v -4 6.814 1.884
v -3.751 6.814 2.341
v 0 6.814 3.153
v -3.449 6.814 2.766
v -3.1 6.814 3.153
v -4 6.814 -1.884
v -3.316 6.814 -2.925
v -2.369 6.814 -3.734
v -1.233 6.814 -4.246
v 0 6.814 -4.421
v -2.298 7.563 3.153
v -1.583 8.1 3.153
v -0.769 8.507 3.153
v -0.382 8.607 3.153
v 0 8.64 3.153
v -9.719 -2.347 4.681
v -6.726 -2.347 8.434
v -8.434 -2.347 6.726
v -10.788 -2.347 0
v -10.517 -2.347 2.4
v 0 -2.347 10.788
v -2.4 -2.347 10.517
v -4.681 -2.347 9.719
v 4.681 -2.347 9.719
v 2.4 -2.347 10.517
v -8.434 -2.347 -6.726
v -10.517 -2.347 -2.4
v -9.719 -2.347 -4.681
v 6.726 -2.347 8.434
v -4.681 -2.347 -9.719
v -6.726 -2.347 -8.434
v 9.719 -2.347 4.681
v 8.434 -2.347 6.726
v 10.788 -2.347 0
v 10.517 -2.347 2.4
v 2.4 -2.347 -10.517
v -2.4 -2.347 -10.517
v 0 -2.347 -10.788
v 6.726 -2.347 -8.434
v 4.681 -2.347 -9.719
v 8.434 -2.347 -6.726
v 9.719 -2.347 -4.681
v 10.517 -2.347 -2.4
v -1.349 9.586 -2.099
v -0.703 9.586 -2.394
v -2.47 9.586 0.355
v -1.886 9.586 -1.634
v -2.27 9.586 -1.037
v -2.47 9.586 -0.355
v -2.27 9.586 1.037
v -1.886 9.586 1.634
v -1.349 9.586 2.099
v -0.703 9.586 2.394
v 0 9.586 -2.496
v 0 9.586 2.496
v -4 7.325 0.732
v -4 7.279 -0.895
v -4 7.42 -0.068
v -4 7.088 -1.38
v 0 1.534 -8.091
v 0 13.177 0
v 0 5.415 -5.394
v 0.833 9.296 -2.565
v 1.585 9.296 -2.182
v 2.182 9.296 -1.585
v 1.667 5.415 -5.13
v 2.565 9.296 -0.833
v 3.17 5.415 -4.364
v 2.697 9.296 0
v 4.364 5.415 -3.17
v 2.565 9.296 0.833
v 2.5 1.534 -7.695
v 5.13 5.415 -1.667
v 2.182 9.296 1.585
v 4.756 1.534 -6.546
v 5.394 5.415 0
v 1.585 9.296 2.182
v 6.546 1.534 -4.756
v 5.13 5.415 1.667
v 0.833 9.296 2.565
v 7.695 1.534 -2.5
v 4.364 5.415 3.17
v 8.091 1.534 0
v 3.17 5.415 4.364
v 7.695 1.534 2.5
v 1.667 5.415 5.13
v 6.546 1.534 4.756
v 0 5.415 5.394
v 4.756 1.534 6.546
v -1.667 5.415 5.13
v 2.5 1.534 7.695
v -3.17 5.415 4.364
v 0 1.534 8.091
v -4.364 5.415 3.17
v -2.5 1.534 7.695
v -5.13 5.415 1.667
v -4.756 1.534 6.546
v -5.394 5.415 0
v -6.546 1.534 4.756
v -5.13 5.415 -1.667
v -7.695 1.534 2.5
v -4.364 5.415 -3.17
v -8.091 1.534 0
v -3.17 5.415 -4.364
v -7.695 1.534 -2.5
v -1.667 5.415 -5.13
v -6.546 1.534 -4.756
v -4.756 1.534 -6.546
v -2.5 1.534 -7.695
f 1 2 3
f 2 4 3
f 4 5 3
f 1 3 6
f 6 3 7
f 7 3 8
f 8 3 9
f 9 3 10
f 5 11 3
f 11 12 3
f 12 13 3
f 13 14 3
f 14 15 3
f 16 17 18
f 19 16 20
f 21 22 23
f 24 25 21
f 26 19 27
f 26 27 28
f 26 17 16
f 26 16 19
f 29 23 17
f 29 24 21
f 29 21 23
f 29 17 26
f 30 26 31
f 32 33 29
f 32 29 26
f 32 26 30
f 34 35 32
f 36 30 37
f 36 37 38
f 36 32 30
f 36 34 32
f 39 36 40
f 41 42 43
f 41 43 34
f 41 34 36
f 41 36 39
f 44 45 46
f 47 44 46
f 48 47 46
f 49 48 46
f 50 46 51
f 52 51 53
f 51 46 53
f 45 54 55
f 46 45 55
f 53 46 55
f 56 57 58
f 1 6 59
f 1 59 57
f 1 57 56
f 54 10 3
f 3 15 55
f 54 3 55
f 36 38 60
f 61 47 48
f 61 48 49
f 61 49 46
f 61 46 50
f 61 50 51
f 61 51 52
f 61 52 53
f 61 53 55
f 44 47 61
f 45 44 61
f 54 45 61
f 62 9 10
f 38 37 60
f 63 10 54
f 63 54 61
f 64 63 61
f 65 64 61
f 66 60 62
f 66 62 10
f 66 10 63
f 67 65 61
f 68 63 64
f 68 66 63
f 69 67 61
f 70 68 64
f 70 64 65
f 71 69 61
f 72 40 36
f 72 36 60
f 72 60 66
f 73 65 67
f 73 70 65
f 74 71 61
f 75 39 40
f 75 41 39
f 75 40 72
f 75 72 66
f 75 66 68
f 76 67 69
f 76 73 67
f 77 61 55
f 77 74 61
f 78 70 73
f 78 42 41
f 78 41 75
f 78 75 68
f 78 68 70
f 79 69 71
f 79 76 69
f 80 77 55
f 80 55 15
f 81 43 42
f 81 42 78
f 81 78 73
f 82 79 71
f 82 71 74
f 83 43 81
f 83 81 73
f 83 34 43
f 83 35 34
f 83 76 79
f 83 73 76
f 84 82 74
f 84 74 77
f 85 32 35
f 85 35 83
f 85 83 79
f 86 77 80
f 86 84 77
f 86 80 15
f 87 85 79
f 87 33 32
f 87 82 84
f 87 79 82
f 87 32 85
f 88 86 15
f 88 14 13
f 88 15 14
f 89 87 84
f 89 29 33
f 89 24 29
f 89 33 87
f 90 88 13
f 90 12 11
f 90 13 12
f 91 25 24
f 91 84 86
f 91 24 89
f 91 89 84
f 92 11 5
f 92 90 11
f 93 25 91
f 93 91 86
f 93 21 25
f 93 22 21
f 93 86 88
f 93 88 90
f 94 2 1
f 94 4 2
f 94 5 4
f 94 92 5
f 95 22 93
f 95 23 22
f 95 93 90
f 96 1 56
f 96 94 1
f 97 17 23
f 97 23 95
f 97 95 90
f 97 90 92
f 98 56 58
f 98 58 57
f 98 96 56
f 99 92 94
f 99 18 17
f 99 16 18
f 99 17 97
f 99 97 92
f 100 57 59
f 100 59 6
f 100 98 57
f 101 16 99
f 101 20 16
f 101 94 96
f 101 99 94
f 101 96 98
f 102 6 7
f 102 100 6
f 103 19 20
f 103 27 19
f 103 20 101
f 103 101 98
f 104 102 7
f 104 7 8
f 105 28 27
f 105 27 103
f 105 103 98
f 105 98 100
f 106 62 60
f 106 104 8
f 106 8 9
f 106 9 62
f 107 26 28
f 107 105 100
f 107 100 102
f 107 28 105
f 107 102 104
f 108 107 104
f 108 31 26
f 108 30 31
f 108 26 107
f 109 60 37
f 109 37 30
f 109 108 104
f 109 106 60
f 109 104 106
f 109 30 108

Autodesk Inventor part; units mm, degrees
ref_plane "YZ Plane" through (0, 0, 0) normal (1, 0, 0) x (0, 1, 0)
ref_plane "XZ Plane" through (0, 0, 0) normal (0, 1, 0) x (-1, 0, 0)
ref_plane "XY Plane" through (0, 0, 0) normal (0, 0, 1) x (1, 0, 0)
sketch "Эскиз4" plane through (0, 0, 0) normal (1, 0, 0) x (0, 1, 0)
  line L0 (13.1772, 0) -> (-2.347, 0)
  line L1 (-2.347, 0) -> (-2.347, -10.7877)
  line L2 (-2.347, -10.7877) -> (13.1772, 0)
  point P0 (0, 0)
revolve "Вращение2" add sketch "Эскиз4" angle 360 about axis through (0, 13.1772, 0) along (0, -1, 0)
sketch "Эскиз5" plane through (0, 0, 0) normal (1, 0, 0) x (0, 1, 0)
  line L0 (13.1772, 0) -> (-2.347, -10.7877) projected
  line L1 (9.586, 3.1529) -> (6.8145, 3.1529)
  line L2 (6.8145, 3.1529) -> (6.8145, -4.4214)
  line L3 (6.8145, -4.4214) -> (9.586, -4.4214)
  line L4 (9.586, -4.4214) -> (9.586, 3.1529)
  point P0 (0, 0)
extrude "Выдавливание1" cut sketch "Эскиз5" against normal blind 4
properties part number "вырез"
